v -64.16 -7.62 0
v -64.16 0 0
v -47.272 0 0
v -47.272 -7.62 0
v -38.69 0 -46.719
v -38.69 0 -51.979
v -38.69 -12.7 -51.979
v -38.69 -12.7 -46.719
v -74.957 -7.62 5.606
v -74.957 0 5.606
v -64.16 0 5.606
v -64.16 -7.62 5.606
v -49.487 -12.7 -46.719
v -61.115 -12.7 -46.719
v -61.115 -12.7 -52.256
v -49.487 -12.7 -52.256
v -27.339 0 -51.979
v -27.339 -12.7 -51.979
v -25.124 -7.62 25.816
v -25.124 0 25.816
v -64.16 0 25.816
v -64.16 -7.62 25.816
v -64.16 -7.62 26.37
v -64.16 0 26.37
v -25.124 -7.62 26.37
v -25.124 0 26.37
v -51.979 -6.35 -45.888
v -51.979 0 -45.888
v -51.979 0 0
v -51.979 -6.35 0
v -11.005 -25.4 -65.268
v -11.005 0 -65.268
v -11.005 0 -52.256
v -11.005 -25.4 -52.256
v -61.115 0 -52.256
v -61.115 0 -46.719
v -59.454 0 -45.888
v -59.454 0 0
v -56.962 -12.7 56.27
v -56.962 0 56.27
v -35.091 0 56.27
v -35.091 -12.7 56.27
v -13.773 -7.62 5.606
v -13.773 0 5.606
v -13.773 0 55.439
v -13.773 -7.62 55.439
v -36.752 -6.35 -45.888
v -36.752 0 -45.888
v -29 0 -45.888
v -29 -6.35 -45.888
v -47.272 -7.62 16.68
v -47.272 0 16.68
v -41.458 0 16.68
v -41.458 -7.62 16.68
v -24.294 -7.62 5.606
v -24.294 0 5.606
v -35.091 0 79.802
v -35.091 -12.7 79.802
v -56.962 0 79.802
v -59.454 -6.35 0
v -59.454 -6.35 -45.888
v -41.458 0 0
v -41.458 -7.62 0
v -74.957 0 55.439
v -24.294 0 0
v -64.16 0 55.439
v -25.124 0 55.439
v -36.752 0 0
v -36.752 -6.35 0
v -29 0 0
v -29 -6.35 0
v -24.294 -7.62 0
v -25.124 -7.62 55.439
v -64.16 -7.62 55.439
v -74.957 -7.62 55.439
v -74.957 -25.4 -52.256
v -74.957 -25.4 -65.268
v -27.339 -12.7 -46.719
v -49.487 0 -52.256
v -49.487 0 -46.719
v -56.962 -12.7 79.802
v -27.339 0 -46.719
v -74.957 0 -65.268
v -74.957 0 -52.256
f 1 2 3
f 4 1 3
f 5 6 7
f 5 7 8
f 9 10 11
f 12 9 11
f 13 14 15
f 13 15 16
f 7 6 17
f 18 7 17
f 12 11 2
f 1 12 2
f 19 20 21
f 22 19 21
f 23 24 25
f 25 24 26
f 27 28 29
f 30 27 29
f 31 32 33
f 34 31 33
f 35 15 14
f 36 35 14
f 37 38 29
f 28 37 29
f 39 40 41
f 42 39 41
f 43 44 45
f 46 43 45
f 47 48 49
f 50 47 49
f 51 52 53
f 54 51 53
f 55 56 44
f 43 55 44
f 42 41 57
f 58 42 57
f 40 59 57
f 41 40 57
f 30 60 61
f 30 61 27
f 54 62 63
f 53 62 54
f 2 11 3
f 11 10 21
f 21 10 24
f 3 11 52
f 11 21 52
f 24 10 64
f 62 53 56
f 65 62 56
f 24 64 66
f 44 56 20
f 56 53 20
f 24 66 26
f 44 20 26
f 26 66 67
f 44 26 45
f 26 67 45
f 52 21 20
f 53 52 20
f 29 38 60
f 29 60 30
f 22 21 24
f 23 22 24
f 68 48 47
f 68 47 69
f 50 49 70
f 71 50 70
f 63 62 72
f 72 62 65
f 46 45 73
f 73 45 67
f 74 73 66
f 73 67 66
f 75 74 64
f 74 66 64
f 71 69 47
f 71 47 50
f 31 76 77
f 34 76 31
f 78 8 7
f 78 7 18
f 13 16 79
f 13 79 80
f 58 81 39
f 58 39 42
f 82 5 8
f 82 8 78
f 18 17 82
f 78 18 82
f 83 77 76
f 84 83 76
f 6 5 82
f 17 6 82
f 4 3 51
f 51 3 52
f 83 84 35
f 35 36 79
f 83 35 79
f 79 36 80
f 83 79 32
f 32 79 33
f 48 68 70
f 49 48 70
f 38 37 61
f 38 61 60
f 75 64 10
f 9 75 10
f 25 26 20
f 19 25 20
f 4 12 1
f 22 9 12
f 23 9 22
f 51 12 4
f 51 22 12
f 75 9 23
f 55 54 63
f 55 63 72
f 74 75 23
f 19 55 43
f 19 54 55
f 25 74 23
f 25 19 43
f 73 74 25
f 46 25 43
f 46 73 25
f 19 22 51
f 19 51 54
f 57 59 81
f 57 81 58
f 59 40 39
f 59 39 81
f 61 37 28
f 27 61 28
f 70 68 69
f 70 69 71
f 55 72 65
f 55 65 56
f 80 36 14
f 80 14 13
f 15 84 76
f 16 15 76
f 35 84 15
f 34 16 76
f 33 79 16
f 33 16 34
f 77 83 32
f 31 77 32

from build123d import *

# Parameters (mm, degrees)
F0_W      = 11.6277486086
F0_H      = 5.5370256305
F1_DEPTH  = 12.7
F0_W_2    = 11.3508980721
F0_H_2    = 5.2601732314
F2_W      = 63.9526322484
F2_H      = 13.0120068789
F3_DEPTH  = 25.4
F4_W      = 63.6757835746
F4_H      = 12.1814534068
F5_DEPTH  = 25.4
F6_W      = 7.4749849737
F6_H      = 45.8880886436
F7_DEPTH  = 6.35
F6_W_2    = 7.7518355101
F8_W      = 16.88792184
F8_H      = 16.6802853346
F8_W_2    = 17.1647742391
F9_DEPTH  = 7.62
F10_W     = 39.0360169113
F10_H     = 29.0693752468
F11_DEPTH = 7.62
F12_W     = 21.8712501228
F12_H     = 23.5323570669
F13_DEPTH = 12.7
F14_W     = 2.4916604161
F14_H     = 3.0453652143
F14_W_2   = 2.7685128152
F14_H_2   = 2.4916604161
F14_W_3   = 7.1981325746
F14_H_3   = 2.7685090899
F15_DEPTH = 6.35


with BuildPart() as f1:
    # F0 (on Front) → F1 (new body)
    with BuildSketch(Plane.XZ):
        with Locations((-55.3010292351, -49.4871549308)):
            Rectangle(F0_W, F0_H)
    extrude(amount=F1_DEPTH)

    # F2 (on Front) → F3 (join)
    with BuildSketch(Plane.XZ):
        with Locations((-42.9811514914, -58.7616711855)):
            Rectangle(F2_W, F2_H)
    extrude(amount=F3_DEPTH)

    # F4 (on Front) → F5 (join)
    with BuildSketch(Plane.XZ):
        with Locations((-42.8427271545, -58.6232431233)):
            Rectangle(F4_W, F4_H)
    extrude(amount=F5_DEPTH)


with BuildPart() as f1b:
    # F0 (on Front) → F1, piece 2 (new body)
    with BuildSketch(Plane.XZ):
        with Locations((-33.0145070329, -49.3487287313)):
            Rectangle(F0_W_2, F0_H_2)
    extrude(amount=F1_DEPTH)


with BuildPart() as f7:
    # F6 (on Front) → F7 (new body)
    with BuildSketch(Plane.XZ):
        with Locations((-55.7163078338, -22.9440443218)):
            Rectangle(F6_W, F6_H)
    extrude(amount=F7_DEPTH)


with BuildPart() as f7b:
    # F6 (on Front) → F7, piece 2 (new body)
    with BuildSketch(Plane.XZ):
        with Locations((-32.876082696, -22.9440443218)):
            Rectangle(F6_W_2, F6_H)
    extrude(amount=F7_DEPTH)


with BuildPart() as f9:
    # F8 (on Front) → F9 (new body)
    with BuildSketch(Plane.XZ):
        with Locations((-55.7163041085, 8.3401426673)):
            Rectangle(F8_W, F8_H)
        Polygon((-64.1602650285, 25.8163753897), (-64.1602650285, 16.6802853346), (-47.2723431885, 16.6802853346), (-41.4584688842, 16.6802853346), (-24.2936946452, 16.6802853346), (-24.2936946452, 25.8163753897), align=None)
        with Locations((-32.8760817647, 8.3401426673)):
            Rectangle(F8_W_2, F8_H)
    extrude(amount=F9_DEPTH)

    # F10 (on Front) → F11 (join)
    with BuildSketch(Plane.XZ):
        with Locations((-44.6422565728, 40.9047659487)):
            Rectangle(F10_W, F10_H)
        Polygon((-64.1602650285, 5.6062368676), (-64.1602650285, 26.3700783253), (-64.1602650285, 55.439453572), (-74.9574676156, 55.439453572), (-74.9574676156, 5.6062368676), align=None)
        Polygon((-25.1242481172, 55.439453572), (-25.1242481172, 26.3700783253), (-25.1242481172, 5.6062368676), (-13.7733472511, 5.6062368676), (-13.7733472511, 55.439453572), align=None)
    extrude(amount=F11_DEPTH)


with BuildPart() as f13:
    # F12 (on Front) → F13 (new body)
    with BuildSketch(Plane.XZ):
        with Locations((-46.0265148431, 68.0361855775)):
            Rectangle(F12_W, F12_H)
    extrude(amount=F13_DEPTH)

    # F14 (on Front) → F15 (join)
    with BuildSketch(Plane.XZ):
        with Locations((-51.84039101, 72.4658071995)):
            Rectangle(F14_W, F14_H)
        with Locations((-44.780684635, 72.1889548004)):
            Rectangle(F14_W_2, F14_H_2)
        with Locations((-46.9954945147, 63.4681396186)):
            Rectangle(F14_W_3, F14_H_3)
    extrude(amount=F15_DEPTH)


solid = Compound([f1.part, f1b.part, f7.part, f7b.part, f9.part, f13.part])
